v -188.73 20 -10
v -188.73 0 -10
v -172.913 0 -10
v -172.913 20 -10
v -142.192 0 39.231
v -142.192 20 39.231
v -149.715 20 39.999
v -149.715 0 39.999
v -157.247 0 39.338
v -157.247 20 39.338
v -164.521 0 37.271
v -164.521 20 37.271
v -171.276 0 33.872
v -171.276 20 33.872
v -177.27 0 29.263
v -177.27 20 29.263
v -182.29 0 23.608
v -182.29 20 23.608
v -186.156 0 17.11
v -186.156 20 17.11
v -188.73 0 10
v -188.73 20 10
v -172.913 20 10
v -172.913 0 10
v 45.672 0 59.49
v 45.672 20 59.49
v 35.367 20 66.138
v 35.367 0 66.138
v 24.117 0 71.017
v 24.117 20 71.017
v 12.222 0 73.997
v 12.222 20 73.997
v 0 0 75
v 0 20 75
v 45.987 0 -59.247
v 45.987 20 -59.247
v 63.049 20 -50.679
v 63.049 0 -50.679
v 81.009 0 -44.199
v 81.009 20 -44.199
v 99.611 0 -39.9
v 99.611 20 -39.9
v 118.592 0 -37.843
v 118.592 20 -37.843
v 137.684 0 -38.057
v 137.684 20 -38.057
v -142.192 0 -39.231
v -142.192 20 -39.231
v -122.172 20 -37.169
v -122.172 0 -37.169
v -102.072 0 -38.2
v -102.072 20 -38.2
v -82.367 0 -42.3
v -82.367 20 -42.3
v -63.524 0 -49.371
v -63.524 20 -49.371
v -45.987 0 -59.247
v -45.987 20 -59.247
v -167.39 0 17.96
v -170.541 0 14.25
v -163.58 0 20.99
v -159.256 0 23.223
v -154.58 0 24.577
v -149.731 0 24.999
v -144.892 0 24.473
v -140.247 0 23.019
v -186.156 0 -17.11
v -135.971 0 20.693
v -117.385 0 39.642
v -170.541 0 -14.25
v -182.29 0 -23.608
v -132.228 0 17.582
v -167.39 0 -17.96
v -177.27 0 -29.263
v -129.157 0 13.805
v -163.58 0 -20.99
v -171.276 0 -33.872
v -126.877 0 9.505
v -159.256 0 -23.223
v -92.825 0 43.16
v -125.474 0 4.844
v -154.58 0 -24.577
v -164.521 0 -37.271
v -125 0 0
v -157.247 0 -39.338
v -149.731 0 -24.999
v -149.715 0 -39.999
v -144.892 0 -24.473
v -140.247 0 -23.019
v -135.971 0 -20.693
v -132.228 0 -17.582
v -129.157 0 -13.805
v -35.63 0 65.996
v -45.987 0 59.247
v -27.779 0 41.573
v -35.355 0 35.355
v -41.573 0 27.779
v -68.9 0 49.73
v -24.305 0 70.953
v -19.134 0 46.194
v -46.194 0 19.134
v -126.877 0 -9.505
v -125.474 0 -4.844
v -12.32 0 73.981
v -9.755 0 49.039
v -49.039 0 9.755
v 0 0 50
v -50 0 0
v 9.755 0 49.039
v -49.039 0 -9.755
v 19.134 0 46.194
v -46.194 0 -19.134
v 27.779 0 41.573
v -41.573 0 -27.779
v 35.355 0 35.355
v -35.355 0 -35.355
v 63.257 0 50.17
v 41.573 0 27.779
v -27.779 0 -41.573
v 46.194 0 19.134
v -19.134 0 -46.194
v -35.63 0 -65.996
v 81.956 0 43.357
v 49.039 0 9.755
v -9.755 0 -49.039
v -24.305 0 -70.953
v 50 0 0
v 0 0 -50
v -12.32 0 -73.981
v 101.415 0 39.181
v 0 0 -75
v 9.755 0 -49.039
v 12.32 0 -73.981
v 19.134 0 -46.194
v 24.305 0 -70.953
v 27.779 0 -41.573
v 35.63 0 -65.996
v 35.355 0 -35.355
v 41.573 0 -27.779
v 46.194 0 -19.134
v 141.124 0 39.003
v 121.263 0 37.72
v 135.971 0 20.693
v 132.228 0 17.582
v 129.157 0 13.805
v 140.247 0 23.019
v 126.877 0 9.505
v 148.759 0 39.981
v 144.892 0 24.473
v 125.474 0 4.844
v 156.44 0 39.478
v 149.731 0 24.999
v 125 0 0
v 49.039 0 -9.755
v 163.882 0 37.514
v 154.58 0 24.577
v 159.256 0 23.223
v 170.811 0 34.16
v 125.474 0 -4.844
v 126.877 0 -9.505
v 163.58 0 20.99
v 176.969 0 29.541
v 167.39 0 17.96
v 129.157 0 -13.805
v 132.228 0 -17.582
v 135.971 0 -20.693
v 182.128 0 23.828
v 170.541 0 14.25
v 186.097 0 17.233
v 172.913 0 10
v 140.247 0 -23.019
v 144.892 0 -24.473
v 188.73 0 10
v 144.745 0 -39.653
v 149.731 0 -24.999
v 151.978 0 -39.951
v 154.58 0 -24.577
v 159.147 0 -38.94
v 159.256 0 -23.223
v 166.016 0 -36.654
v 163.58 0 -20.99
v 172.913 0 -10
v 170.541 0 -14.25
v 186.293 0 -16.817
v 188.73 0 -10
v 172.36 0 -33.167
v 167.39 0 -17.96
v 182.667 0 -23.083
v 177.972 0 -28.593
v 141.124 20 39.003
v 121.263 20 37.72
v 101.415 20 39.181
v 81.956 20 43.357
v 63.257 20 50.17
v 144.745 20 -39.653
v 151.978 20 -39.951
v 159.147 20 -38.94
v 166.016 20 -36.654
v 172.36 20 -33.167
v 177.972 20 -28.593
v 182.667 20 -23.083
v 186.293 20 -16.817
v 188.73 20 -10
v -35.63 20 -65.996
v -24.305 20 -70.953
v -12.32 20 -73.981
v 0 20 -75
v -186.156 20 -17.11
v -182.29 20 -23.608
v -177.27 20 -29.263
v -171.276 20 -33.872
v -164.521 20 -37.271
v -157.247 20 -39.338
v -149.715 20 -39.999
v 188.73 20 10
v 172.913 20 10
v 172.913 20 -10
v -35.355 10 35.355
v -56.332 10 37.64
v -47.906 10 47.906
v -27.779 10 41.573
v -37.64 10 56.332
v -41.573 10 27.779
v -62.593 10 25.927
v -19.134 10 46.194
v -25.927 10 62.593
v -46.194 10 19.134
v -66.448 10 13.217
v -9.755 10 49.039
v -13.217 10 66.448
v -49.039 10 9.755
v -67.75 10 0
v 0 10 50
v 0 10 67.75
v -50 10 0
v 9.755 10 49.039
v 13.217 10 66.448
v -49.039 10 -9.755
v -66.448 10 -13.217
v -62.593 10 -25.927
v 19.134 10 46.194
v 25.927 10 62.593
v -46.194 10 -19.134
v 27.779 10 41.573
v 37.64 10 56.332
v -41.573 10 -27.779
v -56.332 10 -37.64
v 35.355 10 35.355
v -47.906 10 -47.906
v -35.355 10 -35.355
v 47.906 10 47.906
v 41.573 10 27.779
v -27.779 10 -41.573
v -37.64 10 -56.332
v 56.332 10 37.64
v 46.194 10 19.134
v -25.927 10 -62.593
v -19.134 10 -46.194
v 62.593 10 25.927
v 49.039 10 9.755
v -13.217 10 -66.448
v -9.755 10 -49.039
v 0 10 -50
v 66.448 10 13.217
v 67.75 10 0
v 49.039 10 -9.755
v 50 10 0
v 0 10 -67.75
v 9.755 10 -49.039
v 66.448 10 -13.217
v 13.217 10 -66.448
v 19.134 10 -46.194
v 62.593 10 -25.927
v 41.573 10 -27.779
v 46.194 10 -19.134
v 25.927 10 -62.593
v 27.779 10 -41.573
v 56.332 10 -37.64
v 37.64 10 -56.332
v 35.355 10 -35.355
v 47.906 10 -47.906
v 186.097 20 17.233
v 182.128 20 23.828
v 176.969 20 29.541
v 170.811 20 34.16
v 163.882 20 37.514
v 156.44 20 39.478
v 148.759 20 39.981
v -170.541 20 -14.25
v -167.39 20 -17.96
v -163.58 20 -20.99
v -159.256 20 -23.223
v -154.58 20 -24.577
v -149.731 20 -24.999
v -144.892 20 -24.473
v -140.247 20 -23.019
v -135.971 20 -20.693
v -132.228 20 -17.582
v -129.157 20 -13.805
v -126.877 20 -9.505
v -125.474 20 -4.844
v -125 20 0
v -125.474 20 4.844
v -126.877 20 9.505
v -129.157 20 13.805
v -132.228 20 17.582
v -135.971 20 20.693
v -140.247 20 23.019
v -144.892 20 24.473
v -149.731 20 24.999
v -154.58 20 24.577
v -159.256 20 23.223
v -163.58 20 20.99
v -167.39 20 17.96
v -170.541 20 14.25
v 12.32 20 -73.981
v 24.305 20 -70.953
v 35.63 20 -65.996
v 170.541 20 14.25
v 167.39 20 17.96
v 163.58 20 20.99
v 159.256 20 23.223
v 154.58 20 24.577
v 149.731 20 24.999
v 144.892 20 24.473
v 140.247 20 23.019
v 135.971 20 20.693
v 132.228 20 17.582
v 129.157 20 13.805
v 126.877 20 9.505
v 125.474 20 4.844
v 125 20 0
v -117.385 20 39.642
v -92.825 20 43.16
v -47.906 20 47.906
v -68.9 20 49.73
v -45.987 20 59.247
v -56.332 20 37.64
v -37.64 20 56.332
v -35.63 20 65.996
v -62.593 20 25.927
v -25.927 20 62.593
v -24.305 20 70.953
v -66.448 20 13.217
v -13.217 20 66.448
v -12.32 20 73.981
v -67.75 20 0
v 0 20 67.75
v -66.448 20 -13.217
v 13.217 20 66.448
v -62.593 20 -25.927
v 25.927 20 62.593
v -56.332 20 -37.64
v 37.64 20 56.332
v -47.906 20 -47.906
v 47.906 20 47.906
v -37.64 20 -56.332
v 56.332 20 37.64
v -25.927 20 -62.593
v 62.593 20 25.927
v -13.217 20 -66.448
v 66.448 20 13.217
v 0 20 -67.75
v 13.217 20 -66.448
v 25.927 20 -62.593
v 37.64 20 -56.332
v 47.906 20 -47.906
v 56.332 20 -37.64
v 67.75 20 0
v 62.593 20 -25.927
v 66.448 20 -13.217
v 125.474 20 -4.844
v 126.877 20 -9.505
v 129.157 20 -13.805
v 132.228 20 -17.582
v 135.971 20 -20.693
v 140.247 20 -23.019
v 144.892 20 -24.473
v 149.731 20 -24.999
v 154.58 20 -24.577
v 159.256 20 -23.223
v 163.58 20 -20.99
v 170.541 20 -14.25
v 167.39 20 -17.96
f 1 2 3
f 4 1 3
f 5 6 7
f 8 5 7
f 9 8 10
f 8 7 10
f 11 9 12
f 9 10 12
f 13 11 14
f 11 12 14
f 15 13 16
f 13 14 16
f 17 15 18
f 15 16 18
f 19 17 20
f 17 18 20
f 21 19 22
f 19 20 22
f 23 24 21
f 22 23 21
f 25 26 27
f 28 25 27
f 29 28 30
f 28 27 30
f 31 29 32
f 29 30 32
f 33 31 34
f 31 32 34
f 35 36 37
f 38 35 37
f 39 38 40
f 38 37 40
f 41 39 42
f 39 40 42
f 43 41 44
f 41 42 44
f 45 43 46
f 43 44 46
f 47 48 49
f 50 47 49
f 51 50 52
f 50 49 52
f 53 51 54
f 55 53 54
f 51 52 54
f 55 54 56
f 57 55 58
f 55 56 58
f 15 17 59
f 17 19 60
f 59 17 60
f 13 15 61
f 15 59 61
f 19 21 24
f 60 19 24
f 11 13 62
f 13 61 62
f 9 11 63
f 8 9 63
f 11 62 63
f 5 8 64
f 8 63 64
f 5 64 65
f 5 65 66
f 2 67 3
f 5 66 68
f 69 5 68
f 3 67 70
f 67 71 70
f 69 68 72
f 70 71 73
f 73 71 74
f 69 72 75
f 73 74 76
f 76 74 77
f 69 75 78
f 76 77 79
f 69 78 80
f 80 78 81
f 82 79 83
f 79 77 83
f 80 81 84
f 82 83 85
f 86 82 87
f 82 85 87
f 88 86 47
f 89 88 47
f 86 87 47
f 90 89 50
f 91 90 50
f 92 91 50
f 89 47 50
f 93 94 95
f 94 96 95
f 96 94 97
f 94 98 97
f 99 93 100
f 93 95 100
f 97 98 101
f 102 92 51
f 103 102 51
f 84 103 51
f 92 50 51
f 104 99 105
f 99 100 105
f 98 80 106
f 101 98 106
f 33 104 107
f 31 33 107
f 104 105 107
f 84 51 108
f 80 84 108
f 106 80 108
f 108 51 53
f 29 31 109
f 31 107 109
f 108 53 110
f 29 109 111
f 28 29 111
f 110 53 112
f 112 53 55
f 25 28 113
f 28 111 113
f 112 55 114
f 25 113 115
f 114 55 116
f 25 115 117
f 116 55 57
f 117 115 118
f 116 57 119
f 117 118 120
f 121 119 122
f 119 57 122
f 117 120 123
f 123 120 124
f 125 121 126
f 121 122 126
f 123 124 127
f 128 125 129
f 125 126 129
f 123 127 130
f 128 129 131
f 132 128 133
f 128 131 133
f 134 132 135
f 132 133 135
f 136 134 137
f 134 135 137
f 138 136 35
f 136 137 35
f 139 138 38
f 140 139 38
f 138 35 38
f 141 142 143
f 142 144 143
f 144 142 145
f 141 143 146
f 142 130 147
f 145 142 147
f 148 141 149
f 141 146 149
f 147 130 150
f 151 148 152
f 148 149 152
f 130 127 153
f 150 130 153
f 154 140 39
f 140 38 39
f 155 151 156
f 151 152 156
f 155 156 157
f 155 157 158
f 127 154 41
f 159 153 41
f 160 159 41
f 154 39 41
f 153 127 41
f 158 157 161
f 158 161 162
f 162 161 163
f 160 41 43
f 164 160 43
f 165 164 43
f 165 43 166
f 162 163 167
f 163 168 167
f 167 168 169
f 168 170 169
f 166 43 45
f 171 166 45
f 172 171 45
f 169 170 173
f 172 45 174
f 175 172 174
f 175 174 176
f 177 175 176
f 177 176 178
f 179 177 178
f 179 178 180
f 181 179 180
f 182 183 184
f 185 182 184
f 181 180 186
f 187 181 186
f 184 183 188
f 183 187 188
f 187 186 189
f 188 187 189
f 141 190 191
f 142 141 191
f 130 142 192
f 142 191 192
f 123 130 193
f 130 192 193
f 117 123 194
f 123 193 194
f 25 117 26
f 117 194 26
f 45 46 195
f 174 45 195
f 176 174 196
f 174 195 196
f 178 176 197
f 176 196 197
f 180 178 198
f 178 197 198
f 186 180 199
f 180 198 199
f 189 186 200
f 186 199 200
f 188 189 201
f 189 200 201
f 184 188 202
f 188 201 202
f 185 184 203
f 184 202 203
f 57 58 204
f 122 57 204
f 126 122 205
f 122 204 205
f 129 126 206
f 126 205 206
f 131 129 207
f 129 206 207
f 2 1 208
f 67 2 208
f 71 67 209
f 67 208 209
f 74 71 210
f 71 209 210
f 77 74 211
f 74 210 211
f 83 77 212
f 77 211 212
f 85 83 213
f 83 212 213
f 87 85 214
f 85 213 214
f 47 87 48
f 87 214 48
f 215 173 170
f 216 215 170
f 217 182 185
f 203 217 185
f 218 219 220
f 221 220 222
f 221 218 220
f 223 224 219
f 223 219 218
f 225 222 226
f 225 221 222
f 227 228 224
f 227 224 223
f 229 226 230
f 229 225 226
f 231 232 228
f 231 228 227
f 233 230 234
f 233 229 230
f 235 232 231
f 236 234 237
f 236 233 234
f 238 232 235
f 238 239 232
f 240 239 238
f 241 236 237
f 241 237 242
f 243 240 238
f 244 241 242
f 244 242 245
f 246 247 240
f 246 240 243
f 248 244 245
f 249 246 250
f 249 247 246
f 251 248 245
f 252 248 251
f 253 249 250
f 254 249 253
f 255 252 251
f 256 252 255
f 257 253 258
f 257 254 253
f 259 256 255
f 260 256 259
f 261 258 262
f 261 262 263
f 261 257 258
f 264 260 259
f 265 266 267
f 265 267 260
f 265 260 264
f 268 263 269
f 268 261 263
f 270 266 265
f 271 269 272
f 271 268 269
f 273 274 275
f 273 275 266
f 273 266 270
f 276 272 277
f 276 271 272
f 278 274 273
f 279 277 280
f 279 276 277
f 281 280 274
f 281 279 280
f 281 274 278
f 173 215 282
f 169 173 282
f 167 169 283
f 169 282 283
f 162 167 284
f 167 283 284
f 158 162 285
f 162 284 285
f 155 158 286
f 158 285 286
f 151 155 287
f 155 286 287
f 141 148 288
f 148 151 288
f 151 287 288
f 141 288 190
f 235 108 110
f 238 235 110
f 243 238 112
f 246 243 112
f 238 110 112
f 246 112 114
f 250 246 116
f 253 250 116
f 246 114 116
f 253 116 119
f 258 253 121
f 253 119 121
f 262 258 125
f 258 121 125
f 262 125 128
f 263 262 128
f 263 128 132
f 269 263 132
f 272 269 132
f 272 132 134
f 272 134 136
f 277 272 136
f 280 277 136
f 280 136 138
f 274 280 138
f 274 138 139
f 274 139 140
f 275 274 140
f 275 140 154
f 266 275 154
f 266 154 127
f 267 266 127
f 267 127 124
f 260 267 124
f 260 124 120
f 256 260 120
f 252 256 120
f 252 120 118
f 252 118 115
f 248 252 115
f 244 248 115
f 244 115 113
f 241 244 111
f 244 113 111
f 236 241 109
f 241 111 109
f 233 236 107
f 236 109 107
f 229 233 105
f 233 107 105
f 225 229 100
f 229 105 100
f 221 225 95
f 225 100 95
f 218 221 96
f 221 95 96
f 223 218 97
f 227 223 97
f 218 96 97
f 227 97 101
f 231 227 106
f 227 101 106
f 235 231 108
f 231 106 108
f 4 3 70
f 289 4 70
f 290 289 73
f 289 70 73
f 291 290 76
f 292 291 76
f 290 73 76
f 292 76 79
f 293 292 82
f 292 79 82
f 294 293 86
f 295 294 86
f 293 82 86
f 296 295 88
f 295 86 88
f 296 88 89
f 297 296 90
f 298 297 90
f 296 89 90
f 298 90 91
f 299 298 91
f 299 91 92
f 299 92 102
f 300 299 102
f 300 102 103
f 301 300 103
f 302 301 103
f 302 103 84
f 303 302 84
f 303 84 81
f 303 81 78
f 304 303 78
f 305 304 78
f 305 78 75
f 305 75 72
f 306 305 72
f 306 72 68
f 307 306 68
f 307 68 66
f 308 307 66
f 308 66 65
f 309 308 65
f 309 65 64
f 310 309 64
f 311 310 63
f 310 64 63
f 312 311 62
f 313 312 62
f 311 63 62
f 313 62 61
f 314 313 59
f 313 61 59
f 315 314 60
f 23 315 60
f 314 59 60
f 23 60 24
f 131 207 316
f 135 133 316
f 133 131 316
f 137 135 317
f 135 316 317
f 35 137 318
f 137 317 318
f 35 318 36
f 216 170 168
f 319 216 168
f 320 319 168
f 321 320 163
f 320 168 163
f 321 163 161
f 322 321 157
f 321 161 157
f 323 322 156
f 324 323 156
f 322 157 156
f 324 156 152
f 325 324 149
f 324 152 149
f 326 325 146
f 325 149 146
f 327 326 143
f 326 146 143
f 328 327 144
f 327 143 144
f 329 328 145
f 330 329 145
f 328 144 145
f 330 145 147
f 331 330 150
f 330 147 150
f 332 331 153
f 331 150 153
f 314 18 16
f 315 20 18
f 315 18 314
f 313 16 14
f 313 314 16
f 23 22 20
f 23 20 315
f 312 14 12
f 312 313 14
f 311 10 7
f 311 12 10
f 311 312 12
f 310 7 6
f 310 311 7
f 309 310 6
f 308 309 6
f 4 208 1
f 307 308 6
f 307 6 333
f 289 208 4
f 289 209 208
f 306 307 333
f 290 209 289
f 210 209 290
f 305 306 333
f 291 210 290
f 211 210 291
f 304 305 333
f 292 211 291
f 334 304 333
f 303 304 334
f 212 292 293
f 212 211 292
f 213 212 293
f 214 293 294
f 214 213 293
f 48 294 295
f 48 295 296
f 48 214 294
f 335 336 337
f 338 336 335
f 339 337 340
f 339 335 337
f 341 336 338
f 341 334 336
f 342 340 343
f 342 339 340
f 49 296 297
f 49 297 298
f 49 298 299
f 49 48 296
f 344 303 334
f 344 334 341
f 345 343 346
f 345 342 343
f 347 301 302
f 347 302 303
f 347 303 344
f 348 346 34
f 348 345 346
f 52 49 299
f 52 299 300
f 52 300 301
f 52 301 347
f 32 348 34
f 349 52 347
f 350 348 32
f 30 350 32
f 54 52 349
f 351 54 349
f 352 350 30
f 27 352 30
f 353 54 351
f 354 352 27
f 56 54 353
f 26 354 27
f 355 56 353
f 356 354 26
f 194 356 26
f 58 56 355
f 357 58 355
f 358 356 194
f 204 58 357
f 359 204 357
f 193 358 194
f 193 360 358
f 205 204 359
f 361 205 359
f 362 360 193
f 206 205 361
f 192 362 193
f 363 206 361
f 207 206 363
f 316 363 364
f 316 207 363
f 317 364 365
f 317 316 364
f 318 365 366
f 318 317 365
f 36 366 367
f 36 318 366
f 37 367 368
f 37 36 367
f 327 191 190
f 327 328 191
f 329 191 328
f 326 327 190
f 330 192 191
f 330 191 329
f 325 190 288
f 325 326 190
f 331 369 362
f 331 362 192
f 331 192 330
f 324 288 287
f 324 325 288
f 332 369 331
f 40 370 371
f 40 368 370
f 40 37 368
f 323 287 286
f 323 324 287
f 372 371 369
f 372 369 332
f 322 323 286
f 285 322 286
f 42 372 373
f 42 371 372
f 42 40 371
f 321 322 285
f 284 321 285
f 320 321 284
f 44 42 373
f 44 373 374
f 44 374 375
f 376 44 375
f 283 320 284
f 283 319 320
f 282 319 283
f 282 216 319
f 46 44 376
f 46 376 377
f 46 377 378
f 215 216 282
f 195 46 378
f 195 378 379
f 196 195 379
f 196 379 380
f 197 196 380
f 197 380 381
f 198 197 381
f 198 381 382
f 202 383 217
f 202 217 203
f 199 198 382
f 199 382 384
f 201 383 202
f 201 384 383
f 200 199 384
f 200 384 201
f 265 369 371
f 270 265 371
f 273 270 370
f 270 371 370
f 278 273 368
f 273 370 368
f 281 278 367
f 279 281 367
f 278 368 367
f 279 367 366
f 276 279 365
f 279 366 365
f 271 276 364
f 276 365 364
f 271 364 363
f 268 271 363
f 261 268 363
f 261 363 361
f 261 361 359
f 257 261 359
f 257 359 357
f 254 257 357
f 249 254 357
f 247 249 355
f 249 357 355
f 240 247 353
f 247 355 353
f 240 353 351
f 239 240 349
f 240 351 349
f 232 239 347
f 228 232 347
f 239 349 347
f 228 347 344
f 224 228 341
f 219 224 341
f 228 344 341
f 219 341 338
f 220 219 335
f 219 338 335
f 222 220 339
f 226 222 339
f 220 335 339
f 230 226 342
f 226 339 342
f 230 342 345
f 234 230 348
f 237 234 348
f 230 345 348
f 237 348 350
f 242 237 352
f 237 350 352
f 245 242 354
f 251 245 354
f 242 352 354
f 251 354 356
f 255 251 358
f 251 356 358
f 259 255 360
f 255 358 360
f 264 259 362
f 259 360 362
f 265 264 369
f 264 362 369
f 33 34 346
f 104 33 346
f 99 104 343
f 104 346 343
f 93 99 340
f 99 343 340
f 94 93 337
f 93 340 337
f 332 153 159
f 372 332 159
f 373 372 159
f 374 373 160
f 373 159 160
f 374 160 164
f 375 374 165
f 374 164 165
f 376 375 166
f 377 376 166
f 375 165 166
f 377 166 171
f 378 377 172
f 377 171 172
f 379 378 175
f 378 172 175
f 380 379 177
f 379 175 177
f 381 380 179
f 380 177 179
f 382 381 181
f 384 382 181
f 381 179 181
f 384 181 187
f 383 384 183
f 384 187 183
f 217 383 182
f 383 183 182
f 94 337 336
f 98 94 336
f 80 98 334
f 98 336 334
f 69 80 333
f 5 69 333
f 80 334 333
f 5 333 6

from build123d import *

# Parameters (mm, degrees)
ESQUISSE1_W             = 380
ESQUISSE1_H             = 150
BOSS_EXTRU_1_DEPTH      = 20
ESQUISSE2_R             = 50
ESQUISSE2_W             = 36.086047363
ESQUISSE2_H             = 20
ENL_V_MAT_EXTRU_2_DEPTH = 21
ESQUISSE4_R             = 67.75
ENL_V_MAT_EXTRU_3_DEPTH = 10
ENL_V_MAT_EXTRU_4_DEPTH = 21


with BuildPart() as part:
    # Esquisse1 → Boss.-Extru.1 (new body)
    with BuildSketch(Plane(origin=(0, 0, 0), x_dir=(1, 0, 0), z_dir=(0, 1, 0))):
        Rectangle(ESQUISSE1_W, ESQUISSE1_H)
    extrude(amount=BOSS_EXTRU_1_DEPTH)

    # Esquisse2 → Enlèv. mat.-Extru.2 (cut, through all)
    with BuildSketch(Plane(origin=(0, 0, 0), x_dir=(-1, 0, 0), z_dir=(0, -1, 0))):
        with BuildLine():
            Line((172.912878475, -10), (190, -10))
            Line((190, -10), (190, 10))
            Line((190, 10), (172.912878475, 10))
            ThreePointArc((172.912878475, 10), (174.472657823, 5.107741092), (175, 0))
            ThreePointArc((175, 0), (174.472657823, -5.107741092), (172.912878475, -10))
        make_face()
        with BuildLine():
            ThreePointArc((172.912878475, 10), (125, 0), (172.912878475, -10))
            Line((172.912878475, -10), (159.255580532, -10))
            Line((159.255580532, -10), (159.255580532, 10))
            Line((159.255580532, 10), (172.912878475, 10))
        make_face()
        with BuildLine():
            Line((159.255580532, -10), (172.912878475, -10))
            ThreePointArc((172.912878475, -10), (174.472657823, -5.107741092), (175, 0))
            ThreePointArc((175, 0), (174.472657823, 5.107741092), (172.912878475, 10))
            Line((172.912878475, 10), (159.255580532, 10))
            Line((159.255580532, 10), (159.255580532, -10))
        make_face()
        Circle(ESQUISSE2_R)
        with BuildLine():
            Line((-154.989806054, 10), (-154.989806054, -10))
            Line((-154.989806054, -10), (-172.912878475, -10))
            ThreePointArc((-172.912878475, -10), (-144.892258908, -24.472657823), (-125, 0))
            ThreePointArc((-125, 0), (-144.892258908, 24.472657823), (-172.912878475, 10))
            Line((-172.912878475, 10), (-154.989806054, 10))
        make_face()
        with BuildLine():
            Line((-172.912878475, -10), (-154.989806054, -10))
            Line((-154.989806054, -10), (-154.989806054, 10))
            Line((-154.989806054, 10), (-172.912878475, 10))
            ThreePointArc((-172.912878475, 10), (-175, 0), (-172.912878475, -10))
        make_face()
        with Locations((-208.043023682, 0)):
            Rectangle(ESQUISSE2_W, ESQUISSE2_H)
        with BuildLine():
            Line((-190, -10), (-172.912878475, -10))
            ThreePointArc((-172.912878475, -10), (-175, 0), (-172.912878475, 10))
            Line((-172.912878475, 10), (-190, 10))
            Line((-190, 10), (-190, -10))
        make_face()
    extrude(amount=-ENL_V_MAT_EXTRU_2_DEPTH, mode=Mode.SUBTRACT)

    # Esquisse4 → Enlèv. mat.-Extru.3 (cut)
    with BuildSketch(Plane(origin=(0, 20, 0), x_dir=(1, 0, 0), z_dir=(0, 1, 0))):
        Circle(ESQUISSE4_R)
    extrude(amount=-ENL_V_MAT_EXTRU_3_DEPTH, mode=Mode.SUBTRACT)

    # Esquisse5 → Enlèv. mat.-Extru.4 (cut, through all)
    with BuildSketch(Plane(origin=(0, 20, 0), x_dir=(1, 0, 0), z_dir=(0, 1, 0))):
        with BuildLine():
            ThreePointArc((-45.987048839, -59.246867758), (-92.825023805, -43.159932782), (-142.192482618, -39.230634361))
            ThreePointArc((-142.192482618, -39.230634361), (-171.275688102, -33.87248287), (-188.729833462, -10))
            Line((-188.729833462, -10), (-190, -10))
            Line((-190, -10), (-190, -75))
            Line((-190, -75), (-6.82e-07, -75))
            ThreePointArc((-6.82e-07, -75), (-24.305194399, -70.952501896), (-45.987048839, -59.246867758))
        make_face()
        with BuildLine():
            ThreePointArc((-188.729833462, 10), (-171.275688102, 33.87248287), (-142.192482618, 39.230634361))
            ThreePointArc((-142.192482618, 39.230634361), (-92.140738349, 39.871003351), (-45.987048839, 59.246867758))
            ThreePointArc((-45.987048839, 59.246867758), (-24.305194053, 70.952502014), (4.9e-08, 75))
            Line((4.9e-08, 75), (-190, 75))
            Line((-190, 75), (-190, 10))
            Line((-190, 10), (-188.729833462, 10))
        make_face()
        with BuildLine():
            Line((190, 75), (4.9e-08, 75))
            ThreePointArc((4.9e-08, 75), (24.3051941, 70.952501998), (45.987048839, 59.246867758))
            ThreePointArc((45.987048839, 59.246867758), (90.245637387, 41.772491768), (137.68369163, 38.056649198))
            ThreePointArc((137.68369163, 38.056649198), (169.266874889, 35.054065841), (188.729833462, 10))
            Line((188.729833462, 10), (190, 10))
            Line((190, 10), (190, 75))
        make_face()
        with BuildLine():
            ThreePointArc((45.671882044, -59.490160452), (24.116777718, -71.016765855), (-6.82e-07, -75))
            Line((-6.82e-07, -75), (190, -75))
            Line((190, -75), (190, -10))
            Line((190, -10), (188.729833462, -10))
            ThreePointArc((188.729833462, -10), (170.810992049, -34.159956234), (141.123685996, -39.002705671))
            ThreePointArc((141.123685996, -39.002705671), (91.61350334, -40.933403872), (45.671882044, -59.490160452))
        make_face()
    extrude(amount=-ENL_V_MAT_EXTRU_4_DEPTH, mode=Mode.SUBTRACT)


solid = part.part
